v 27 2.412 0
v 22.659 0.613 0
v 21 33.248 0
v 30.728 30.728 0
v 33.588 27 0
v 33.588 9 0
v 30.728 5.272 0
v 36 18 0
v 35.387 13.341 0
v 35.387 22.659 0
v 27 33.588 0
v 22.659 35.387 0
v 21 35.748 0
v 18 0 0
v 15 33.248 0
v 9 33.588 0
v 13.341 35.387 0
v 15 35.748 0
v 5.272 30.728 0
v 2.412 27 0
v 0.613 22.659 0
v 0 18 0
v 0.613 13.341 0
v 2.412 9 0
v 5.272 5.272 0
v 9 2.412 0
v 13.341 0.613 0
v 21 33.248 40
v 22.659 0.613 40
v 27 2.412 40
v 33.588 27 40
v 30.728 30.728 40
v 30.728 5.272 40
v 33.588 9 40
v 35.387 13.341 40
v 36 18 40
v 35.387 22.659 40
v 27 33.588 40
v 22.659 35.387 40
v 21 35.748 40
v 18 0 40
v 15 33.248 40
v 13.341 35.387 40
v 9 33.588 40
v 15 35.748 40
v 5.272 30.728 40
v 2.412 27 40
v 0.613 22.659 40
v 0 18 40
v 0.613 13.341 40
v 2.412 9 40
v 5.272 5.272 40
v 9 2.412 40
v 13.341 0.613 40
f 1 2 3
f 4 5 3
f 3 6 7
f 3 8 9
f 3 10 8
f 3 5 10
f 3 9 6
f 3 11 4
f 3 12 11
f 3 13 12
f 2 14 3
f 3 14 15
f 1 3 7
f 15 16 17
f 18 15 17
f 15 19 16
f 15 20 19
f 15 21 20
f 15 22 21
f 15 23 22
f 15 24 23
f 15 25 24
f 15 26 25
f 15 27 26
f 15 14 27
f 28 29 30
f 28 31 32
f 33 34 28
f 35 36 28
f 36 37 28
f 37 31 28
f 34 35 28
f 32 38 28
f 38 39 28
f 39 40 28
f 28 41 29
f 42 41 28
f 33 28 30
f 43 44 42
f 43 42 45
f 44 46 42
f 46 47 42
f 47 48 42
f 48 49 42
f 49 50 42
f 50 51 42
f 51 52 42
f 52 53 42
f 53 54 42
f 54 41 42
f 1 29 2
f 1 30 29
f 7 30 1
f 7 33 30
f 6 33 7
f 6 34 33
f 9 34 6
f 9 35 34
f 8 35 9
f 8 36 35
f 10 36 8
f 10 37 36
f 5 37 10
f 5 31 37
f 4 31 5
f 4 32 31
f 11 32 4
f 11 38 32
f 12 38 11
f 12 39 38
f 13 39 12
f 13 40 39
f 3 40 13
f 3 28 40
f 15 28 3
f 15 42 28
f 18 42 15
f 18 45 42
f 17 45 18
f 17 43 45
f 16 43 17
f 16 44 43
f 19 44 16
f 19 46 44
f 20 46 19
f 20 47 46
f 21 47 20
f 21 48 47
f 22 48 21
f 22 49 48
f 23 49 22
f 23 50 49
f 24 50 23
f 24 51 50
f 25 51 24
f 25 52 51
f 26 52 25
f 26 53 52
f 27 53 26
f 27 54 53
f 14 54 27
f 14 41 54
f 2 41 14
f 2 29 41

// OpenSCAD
$fn = 32;

// ----------------------------------------------------------------------
// Keyway shaft: d36 shaft, key 6 x 2.5 mm
// ----------------------------------------------------------------------

// --- parameters (mm) ---
shaft_r = 18;             // shaft radius
key_w = 6;                // keyway width
key_d = 2.5;              // keyway depth below the surface line
plate_t = 40;             // shaft length, Z (extrusion height)

shaft_d = 2 * shaft_r;  // shaft diameter
circle_step = 15;  // polygon sampling step, degrees

profile = [[13.341, 35.387], [9, 33.588], [5.272, 30.728], [2.412, 27], [0.613, 22.659], [0, 18], [0.613, 13.341], [2.412, 9], [5.272, 5.272], [9, 2.412], [13.341, 0.613], [18, 0], [22.659, 0.613], [27, 2.412], [30.728, 5.272], [33.588, 9], [35.387, 13.341], [36, 18], [35.387, 22.659], [33.588, 27], [30.728, 30.728], [27, 33.588], [22.659, 35.387], [21, 35.748], [21, 33.248], [15, 33.248], [15, 35.748]];  // primary outline, 27 points, counter clockwise

// --- the one profile operation ---
linear_extrude(height = plate_t) polygon(points = profile);
